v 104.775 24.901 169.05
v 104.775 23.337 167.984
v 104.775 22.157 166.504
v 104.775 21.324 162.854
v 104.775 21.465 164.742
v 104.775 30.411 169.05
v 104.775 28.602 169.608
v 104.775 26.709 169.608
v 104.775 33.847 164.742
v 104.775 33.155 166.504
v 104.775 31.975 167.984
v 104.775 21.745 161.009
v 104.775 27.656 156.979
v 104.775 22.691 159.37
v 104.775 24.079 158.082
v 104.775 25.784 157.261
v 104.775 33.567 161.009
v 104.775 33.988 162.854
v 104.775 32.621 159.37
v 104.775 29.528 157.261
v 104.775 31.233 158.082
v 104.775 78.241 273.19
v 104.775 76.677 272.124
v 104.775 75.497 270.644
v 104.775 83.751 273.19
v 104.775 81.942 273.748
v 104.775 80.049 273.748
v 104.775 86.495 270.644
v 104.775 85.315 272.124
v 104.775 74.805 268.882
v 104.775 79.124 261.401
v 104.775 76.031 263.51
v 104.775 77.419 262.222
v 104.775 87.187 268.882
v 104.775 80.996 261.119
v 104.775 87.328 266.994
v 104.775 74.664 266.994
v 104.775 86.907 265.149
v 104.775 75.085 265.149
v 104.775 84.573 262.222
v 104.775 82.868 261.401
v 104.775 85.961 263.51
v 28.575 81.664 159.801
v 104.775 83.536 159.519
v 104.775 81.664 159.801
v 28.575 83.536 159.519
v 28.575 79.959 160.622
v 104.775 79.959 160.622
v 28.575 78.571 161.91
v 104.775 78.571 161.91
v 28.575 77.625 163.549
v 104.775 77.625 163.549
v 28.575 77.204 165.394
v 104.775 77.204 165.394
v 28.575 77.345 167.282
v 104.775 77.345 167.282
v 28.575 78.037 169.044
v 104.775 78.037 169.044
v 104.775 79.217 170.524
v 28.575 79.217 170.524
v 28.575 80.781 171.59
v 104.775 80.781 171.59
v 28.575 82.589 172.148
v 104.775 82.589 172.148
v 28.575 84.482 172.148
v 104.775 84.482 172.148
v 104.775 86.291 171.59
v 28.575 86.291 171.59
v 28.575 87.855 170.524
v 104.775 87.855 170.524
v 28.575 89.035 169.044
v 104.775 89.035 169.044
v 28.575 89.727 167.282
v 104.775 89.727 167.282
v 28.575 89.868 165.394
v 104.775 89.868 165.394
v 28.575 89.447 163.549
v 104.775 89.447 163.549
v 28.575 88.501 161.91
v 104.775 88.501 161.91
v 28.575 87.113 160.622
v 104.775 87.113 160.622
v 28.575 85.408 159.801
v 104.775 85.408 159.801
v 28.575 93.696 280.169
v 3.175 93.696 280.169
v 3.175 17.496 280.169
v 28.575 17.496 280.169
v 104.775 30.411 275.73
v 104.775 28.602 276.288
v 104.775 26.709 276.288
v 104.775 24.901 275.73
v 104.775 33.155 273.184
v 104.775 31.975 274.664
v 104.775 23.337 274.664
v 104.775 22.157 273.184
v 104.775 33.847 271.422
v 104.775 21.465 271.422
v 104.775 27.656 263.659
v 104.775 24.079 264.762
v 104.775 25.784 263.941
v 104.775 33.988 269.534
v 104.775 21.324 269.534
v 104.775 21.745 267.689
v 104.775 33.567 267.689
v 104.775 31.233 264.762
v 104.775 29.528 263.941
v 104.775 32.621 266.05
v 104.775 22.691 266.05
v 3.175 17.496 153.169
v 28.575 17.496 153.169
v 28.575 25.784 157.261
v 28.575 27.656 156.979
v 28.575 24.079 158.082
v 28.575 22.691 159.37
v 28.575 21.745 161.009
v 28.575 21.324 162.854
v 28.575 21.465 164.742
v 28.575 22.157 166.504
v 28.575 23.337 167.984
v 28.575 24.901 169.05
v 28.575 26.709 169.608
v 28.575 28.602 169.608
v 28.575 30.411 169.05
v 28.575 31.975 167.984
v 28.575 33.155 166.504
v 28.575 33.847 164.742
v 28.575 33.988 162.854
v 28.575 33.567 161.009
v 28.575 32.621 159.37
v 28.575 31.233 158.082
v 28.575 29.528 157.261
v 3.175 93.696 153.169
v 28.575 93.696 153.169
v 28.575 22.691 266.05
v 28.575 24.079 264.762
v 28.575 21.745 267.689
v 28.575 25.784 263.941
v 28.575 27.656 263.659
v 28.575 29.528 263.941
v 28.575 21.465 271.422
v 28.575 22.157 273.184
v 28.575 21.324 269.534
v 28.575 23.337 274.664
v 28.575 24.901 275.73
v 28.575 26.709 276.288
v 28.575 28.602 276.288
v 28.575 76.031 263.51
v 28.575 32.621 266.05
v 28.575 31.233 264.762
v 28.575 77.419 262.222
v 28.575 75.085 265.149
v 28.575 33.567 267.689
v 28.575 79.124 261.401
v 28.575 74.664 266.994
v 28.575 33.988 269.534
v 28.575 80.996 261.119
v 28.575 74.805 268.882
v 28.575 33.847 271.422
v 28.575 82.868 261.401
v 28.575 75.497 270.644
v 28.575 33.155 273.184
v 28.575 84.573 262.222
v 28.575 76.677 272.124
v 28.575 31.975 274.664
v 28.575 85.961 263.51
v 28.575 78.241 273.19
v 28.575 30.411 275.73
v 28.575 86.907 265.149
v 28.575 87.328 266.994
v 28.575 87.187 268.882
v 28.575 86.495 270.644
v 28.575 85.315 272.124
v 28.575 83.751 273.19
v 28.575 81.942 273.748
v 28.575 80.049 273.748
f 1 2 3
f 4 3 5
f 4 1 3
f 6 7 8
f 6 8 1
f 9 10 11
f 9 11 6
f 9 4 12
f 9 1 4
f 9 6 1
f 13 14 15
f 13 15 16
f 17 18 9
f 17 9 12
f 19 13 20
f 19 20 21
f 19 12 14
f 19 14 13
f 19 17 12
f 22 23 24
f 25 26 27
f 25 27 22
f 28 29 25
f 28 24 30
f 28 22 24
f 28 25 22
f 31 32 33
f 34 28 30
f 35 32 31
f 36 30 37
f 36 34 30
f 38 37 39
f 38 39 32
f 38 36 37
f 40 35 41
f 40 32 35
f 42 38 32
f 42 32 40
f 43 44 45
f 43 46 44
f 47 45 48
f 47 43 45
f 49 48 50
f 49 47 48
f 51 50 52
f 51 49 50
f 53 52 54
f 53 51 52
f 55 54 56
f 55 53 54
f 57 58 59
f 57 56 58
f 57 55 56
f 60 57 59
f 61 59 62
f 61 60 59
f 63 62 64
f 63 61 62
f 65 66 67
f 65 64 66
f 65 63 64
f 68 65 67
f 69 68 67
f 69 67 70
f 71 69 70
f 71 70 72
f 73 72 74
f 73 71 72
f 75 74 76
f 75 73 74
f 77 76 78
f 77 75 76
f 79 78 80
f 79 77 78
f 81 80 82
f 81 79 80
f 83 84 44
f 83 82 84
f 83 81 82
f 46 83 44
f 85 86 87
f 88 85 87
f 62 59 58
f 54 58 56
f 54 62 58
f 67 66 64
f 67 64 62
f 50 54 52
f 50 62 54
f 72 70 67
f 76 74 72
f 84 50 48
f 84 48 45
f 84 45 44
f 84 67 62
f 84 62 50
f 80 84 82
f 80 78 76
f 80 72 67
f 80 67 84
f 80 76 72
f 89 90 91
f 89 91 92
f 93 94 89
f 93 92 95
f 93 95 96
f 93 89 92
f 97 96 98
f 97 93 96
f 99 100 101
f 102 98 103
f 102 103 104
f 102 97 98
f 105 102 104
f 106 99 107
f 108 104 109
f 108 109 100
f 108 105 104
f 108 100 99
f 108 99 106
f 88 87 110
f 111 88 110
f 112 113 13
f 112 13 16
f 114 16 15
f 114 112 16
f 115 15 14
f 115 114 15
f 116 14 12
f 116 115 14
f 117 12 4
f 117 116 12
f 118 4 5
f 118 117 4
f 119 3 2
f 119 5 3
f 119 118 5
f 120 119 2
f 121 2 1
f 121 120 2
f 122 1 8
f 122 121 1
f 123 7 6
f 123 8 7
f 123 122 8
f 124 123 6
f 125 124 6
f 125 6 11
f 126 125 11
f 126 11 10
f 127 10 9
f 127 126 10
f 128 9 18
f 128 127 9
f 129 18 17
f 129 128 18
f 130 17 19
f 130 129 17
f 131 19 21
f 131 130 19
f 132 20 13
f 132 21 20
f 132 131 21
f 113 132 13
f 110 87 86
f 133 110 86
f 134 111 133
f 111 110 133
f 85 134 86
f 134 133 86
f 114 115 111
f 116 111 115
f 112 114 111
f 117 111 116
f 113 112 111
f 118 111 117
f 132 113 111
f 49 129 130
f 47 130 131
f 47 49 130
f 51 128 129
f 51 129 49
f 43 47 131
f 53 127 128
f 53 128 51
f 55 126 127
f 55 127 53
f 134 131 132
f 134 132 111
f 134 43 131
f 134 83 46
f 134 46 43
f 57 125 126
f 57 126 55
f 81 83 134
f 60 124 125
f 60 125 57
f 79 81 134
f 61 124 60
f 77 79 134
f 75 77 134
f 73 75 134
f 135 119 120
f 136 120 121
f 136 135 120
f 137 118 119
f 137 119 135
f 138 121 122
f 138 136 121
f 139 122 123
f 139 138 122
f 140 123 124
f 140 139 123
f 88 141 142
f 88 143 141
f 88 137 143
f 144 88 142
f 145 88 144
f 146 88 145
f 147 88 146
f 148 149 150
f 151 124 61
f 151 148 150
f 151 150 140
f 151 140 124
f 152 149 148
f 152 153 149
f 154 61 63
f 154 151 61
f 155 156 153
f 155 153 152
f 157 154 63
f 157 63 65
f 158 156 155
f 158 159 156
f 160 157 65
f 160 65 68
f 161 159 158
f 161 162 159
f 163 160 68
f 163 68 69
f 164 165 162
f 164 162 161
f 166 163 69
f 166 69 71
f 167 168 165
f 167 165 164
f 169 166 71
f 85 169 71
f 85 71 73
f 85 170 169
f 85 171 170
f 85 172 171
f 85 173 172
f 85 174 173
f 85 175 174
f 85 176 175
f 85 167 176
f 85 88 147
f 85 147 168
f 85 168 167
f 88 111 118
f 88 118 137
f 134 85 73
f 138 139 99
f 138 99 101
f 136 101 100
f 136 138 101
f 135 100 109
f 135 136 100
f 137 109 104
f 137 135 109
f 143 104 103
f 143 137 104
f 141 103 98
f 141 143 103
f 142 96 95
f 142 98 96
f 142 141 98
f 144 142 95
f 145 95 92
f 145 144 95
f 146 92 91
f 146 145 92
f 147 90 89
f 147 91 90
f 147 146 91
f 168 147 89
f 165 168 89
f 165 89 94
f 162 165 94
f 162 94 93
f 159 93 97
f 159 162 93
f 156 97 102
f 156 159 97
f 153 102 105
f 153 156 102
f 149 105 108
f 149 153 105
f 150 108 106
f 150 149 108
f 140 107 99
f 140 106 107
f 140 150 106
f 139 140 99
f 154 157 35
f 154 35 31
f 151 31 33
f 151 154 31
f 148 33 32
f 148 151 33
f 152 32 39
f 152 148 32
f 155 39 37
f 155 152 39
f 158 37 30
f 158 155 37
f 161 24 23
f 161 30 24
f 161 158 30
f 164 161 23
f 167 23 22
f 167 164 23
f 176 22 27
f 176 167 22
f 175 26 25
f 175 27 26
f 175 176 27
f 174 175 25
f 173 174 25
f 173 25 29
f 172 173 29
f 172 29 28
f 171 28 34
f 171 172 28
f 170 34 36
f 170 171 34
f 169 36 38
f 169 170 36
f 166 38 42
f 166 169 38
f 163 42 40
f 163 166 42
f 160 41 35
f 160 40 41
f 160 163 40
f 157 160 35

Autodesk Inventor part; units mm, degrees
ref_plane "XZ Plane" through (0, 0, 0) normal (0, 1, 0) x (-1, 0, 0)
ref_plane "XY Plane" through (0, 0, 0) normal (0, 0, 1) x (1, 0, 0)
ref_plane "Work Plane1" through (3.175, 0, 0) normal (1, 0, 0) x (0, 1, 0)
sketch "Sketch1" plane through (3.175, 0, 0) normal (1, 0, 0) x (0, 1, 0)
  line L0 (93.6959, 280.1689) -> (17.4959, 280.1689)
  line L1 (17.4959, 280.1689) -> (17.4959, 153.1689)
  line L2 (17.4959, 153.1689) -> (93.6959, 153.1689)
  line L3 (93.6959, 153.1689) -> (93.6959, 280.1689)
  point P0 (0, 0)
  dimension "d1" = 127
  dimension "d2" = 76.2
extrude "Extrusion1" add sketch "Sketch1" along normal blind 25.4
sketch "Sketch2" plane through (28.575, 0, 0) normal (1, 0, 0) x (0, 0, -1)
  circle A0 centre (-270.0089, 27.6559) radius 6.35
  line L0 (-280.1689, 93.6959) -> (-280.1689, 17.4959) projected
  line L1 (-280.1689, 17.4959) -> (-153.1689, 17.4959) projected
  line L2 (-153.1689, 17.4959) -> (-153.1689, 93.6959) projected
  line L3 (-153.1689, 93.6959) -> (-280.1689, 93.6959) projected
  circle A1 centre (-165.8689, 83.5359) radius 6.35
  circle A2 centre (-165.8689, 83.5359) radius 6.35
  circle A3 centre (-165.8689, 83.5359) radius 6.35
  line L4 (-153.1689, 17.4959) -> (-153.1689, 93.6959) projected
  circle A4 centre (-267.4689, 80.9959) radius 6.35
  circle A5 centre (-163.3289, 27.6559) radius 6.35
  point P0 (0, 0)
  dimension "d5" = 12.7
  dimension "d6" = 10.16
  dimension "d7" = 10.16
  dimension "d8" = 10.16
  dimension "d9" = 12.7
  dimension "d10" = 12.7
  dimension "d11" = 12.7
  dimension "d12" = 12.7
  dimension "d13" = 12.7
  dimension "d14" = 12.7
  dimension "d15" = 10.16
  dimension "d16" = 10.16
extrude "Extrusion2" add sketch "Sketch2" along normal blind 76.2 contours A0 | A1 | A4 | A5
equation "\"d7\" = d6"
equation "\"d8\" = d7"
equation "\"d9\" = d5"
equation "\"d10\" = d5"
equation "\"d11\" = d5"
equation "\"d12\" = d9"
equation "\"d13\" = d12"
equation "\"d14\" = d5"
equation "\"d15\" = d6"
equation "\"d16\" = d6"
properties part number "Table"
